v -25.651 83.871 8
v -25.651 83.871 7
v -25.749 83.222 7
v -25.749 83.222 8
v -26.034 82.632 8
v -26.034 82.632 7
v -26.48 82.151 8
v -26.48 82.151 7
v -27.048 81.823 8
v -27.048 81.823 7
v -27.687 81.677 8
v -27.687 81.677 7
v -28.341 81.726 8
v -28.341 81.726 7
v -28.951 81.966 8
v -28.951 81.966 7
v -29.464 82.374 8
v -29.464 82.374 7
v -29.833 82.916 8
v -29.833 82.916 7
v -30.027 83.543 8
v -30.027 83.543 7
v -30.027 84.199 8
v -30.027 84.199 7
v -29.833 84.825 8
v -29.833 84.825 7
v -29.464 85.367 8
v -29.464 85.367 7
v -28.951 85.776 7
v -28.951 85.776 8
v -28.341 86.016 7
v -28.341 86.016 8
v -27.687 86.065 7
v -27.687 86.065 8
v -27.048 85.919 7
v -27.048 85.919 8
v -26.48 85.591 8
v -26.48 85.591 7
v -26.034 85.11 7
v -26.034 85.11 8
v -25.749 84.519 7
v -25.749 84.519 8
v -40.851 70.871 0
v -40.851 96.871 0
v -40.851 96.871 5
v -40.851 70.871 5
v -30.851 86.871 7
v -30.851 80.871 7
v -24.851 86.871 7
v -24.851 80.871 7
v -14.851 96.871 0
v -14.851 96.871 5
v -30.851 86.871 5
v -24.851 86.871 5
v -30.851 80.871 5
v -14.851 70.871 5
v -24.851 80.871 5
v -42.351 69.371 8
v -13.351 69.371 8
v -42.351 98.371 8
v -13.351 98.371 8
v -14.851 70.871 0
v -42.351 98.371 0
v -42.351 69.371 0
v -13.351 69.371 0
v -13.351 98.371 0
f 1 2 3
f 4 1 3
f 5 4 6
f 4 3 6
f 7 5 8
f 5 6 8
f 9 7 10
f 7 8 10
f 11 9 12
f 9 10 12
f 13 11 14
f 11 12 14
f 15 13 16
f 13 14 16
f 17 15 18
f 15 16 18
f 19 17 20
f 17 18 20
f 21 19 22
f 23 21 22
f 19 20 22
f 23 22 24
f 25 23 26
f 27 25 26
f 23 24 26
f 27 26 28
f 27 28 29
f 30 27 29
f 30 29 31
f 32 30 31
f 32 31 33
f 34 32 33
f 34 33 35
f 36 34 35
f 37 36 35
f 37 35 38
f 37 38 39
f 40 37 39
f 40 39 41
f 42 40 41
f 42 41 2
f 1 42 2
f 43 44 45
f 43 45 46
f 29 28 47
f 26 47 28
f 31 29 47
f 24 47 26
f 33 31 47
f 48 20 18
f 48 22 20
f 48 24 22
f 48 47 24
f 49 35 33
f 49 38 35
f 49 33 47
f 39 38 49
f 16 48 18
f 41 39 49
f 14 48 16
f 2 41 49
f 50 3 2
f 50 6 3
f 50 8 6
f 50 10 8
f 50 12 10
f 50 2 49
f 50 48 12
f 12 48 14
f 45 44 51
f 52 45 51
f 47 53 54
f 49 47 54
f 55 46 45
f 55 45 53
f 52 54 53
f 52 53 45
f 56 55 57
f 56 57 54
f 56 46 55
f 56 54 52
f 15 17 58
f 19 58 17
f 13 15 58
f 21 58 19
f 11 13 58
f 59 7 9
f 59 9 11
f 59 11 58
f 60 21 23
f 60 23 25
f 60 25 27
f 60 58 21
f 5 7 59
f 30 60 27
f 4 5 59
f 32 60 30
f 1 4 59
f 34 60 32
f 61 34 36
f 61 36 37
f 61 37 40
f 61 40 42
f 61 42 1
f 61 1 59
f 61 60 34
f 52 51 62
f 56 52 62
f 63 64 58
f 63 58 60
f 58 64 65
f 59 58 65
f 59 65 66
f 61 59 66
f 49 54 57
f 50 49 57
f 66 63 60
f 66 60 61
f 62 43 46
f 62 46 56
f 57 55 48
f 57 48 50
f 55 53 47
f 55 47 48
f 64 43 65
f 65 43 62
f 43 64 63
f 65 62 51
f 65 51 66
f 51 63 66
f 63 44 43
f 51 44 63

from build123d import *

# Parameters (mm, degrees)
SKETCH002_W     = 29
SKETCH002_H     = 29
PAD001_DEPTH    = 8
SKETCH003_W     = 26
SKETCH003_H     = 26
POCKET001_DEPTH = 5
SKETCH004_W     = 6
SKETCH004_H     = 6
POCKET002_DEPTH = 2
SKETCH005_R     = 2.2
POCKET003_DEPTH = 5


with BuildPart() as part:
    # Sketch002 → Pad001 (new body)
    with BuildSketch(Plane.XY):
        with Locations((-27.851261, 83.870864)):
            Rectangle(SKETCH002_W, SKETCH002_H)
    extrude(amount=PAD001_DEPTH)

    # Sketch003 (on Face5 of Pad001) → Pocket001 (cut)
    with BuildSketch(Plane(origin=(0, 0, 0), x_dir=(1, 0, 0), z_dir=(0, 0, -1))):
        with Locations((-27.851261, -83.870864)):
            Rectangle(SKETCH003_W, SKETCH003_H)
    extrude(amount=-POCKET001_DEPTH, mode=Mode.SUBTRACT)

    # Sketch004 (on Face11 of Pocket001) → Pocket002 (cut)
    with BuildSketch(Plane(origin=(0, 0, 5), x_dir=(1, 0, 0), z_dir=(0, 0, -1))):
        with Locations((-27.851261, -83.870864)):
            Rectangle(SKETCH004_W, SKETCH004_H)
    extrude(amount=-POCKET002_DEPTH, mode=Mode.SUBTRACT)

    # Sketch005 (on Face16 of Pocket002) → Pocket003 (cut)
    with BuildSketch(Plane(origin=(0, 0, 7), x_dir=(1, 0, 0), z_dir=(0, 0, -1))):
        with Locations((-27.851261, -83.870864)):
            Circle(SKETCH005_R)
    extrude(amount=-POCKET003_DEPTH, mode=Mode.SUBTRACT)


solid = part.part
